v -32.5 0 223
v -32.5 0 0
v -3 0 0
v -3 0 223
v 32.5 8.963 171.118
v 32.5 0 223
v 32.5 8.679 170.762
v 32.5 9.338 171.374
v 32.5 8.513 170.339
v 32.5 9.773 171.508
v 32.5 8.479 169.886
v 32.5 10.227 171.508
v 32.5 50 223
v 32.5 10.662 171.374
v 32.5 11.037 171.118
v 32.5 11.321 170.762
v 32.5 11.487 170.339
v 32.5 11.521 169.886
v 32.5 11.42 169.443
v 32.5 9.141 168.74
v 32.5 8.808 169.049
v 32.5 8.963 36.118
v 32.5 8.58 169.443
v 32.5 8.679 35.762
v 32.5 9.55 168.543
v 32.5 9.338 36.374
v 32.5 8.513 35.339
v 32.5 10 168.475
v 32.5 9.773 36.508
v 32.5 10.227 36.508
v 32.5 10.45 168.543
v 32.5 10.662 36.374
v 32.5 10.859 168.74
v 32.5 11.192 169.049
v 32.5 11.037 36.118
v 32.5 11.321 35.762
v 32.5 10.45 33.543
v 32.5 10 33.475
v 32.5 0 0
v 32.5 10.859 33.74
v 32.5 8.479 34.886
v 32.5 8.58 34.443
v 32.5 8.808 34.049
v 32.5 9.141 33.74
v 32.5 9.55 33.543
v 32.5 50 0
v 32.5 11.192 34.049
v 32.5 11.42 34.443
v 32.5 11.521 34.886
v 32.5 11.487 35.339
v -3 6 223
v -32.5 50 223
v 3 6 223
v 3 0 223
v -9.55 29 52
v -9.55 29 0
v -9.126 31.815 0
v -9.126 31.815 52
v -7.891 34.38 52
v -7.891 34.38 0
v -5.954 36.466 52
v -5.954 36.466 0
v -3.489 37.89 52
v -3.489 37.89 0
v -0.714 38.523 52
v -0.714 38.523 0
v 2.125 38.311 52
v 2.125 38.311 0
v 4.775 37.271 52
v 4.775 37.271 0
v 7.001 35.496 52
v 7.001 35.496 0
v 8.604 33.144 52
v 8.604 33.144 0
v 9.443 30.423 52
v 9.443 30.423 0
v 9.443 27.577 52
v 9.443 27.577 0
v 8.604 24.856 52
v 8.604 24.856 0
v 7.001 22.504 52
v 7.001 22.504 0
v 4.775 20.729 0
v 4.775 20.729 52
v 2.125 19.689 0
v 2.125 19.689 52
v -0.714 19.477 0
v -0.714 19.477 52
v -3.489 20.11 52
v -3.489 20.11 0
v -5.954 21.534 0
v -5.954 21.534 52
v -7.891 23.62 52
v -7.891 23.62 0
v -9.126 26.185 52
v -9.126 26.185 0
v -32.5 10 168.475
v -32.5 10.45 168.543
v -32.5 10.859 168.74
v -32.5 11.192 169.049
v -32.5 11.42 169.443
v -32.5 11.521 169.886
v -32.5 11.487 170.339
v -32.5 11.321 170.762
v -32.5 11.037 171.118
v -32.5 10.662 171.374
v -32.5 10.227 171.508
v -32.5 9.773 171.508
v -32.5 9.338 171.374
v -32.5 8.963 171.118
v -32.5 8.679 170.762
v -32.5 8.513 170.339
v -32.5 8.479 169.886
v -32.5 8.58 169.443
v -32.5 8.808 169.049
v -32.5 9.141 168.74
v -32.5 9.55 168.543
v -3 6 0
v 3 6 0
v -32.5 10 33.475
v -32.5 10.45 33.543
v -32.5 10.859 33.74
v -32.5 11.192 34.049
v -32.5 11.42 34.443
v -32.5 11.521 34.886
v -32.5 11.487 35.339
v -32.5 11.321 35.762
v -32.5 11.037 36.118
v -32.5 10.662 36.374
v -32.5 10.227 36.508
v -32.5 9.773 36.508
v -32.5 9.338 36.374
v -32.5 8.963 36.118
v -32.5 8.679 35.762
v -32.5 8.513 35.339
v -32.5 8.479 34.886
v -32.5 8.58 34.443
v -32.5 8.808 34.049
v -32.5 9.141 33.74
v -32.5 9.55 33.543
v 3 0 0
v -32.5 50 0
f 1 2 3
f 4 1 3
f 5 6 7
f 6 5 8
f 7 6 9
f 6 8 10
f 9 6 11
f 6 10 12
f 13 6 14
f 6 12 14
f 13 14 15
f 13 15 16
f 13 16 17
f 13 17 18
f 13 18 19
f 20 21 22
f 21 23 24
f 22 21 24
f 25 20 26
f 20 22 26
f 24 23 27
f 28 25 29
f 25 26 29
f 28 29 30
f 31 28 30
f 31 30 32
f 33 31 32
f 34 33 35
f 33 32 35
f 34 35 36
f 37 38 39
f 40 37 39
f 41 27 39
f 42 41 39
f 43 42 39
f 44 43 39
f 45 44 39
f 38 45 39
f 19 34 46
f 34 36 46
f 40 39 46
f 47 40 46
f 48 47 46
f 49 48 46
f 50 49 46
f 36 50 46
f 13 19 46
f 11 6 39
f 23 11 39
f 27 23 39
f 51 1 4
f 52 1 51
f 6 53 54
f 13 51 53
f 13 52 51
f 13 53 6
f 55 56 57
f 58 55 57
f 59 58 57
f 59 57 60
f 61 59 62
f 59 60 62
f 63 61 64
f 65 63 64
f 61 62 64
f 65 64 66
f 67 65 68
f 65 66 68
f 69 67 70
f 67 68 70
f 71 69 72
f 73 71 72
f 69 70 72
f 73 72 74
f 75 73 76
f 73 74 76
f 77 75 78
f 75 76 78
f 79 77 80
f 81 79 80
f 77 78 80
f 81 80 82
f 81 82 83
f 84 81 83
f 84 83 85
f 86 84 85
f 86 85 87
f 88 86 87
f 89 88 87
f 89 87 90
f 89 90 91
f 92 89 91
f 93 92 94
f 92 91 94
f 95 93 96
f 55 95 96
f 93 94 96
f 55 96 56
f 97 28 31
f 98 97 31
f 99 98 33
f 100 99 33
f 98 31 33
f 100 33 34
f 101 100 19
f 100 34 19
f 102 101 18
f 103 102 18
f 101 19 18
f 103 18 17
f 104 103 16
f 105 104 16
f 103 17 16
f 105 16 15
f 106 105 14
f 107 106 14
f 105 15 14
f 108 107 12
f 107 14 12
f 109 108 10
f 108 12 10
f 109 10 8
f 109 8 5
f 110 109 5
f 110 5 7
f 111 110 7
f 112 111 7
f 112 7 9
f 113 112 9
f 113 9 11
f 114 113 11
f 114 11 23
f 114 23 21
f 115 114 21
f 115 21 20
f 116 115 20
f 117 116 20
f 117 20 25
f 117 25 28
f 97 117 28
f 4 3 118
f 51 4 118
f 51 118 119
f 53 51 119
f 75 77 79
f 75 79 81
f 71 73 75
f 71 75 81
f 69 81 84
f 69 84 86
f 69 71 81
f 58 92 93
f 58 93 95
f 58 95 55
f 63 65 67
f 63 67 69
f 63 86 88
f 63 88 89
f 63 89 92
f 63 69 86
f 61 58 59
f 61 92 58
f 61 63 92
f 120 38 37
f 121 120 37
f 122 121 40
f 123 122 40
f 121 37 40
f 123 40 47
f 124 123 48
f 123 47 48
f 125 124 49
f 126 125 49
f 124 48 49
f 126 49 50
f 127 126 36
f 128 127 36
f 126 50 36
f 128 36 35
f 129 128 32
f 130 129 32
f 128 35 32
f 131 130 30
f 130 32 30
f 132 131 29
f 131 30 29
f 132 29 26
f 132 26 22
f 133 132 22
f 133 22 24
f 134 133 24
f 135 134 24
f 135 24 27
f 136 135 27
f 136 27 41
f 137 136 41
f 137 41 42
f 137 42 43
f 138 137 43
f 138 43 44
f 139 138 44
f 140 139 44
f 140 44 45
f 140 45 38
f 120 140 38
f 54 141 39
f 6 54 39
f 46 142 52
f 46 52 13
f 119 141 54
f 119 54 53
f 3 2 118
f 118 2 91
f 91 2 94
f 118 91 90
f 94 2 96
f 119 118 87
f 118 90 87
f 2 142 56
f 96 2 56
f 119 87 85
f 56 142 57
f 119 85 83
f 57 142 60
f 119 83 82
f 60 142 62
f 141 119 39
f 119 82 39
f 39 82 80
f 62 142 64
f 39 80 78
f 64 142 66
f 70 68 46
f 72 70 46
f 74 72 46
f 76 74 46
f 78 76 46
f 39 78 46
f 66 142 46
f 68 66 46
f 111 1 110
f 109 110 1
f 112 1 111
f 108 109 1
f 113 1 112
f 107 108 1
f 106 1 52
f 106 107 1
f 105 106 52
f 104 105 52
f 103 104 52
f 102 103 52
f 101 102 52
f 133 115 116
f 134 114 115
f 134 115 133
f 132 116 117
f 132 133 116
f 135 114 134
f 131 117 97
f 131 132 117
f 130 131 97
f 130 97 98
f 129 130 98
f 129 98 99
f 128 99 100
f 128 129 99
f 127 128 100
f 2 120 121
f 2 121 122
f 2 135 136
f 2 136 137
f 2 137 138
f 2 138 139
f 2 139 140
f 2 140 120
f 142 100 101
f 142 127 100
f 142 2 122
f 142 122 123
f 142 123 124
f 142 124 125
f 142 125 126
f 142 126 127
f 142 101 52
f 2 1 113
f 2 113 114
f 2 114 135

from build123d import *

# Parameters (mm, degrees)
SKETCH1_W                = 65
SKETCH1_H                = 50
BALSA_BLOCK_DEPTH        = 223
SKETCH2_W                = 6
SKETCH2_H                = 6
SCREW_EYE_SLOT_DEPTH     = 231.835980731
SKETCH3_R                = 9.55
CO2_CARTRIDGE_HOLE_DEPTH = 52
SKETCH4_R                = 1.525
AXLE_HOLE_CUT_OUT_DEPTH  = 238.60050505


with BuildPart() as part:
    # Sketch1 → Balsa Block (new body)
    with BuildSketch(Plane.XY):
        with Locations((0, 25)):
            Rectangle(SKETCH1_W, SKETCH1_H)
    extrude(amount=BALSA_BLOCK_DEPTH)

    # Sketch2 → Screw Eye Slot (cut, through all)
    with BuildSketch(Plane.XY.offset(223)):
        with Locations((0, 3)):
            Rectangle(SKETCH2_W, SKETCH2_H)
    extrude(amount=-SCREW_EYE_SLOT_DEPTH, mode=Mode.SUBTRACT)

    # Sketch3 → CO2 Cartridge Hole (cut)
    with BuildSketch(Plane(origin=(0, 0, 0), x_dir=(-1, 0, 0), z_dir=(0, 0, -1))):
        with Locations((0, 29)):
            Circle(SKETCH3_R)
    extrude(amount=-CO2_CARTRIDGE_HOLE_DEPTH, mode=Mode.SUBTRACT)

    # Sketch4 → Axle Hole Cut Out (cut, through all)
    with BuildSketch(Plane(origin=(32.5, 0, 0), x_dir=(0, 0, -1), z_dir=(1, 0, 0))):
        with Locations((-170, 10)):
            Circle(SKETCH4_R)
        with Locations((-35, 10)):
            Circle(SKETCH4_R)
    extrude(amount=-AXLE_HOLE_CUT_OUT_DEPTH, mode=Mode.SUBTRACT)


solid = part.part
